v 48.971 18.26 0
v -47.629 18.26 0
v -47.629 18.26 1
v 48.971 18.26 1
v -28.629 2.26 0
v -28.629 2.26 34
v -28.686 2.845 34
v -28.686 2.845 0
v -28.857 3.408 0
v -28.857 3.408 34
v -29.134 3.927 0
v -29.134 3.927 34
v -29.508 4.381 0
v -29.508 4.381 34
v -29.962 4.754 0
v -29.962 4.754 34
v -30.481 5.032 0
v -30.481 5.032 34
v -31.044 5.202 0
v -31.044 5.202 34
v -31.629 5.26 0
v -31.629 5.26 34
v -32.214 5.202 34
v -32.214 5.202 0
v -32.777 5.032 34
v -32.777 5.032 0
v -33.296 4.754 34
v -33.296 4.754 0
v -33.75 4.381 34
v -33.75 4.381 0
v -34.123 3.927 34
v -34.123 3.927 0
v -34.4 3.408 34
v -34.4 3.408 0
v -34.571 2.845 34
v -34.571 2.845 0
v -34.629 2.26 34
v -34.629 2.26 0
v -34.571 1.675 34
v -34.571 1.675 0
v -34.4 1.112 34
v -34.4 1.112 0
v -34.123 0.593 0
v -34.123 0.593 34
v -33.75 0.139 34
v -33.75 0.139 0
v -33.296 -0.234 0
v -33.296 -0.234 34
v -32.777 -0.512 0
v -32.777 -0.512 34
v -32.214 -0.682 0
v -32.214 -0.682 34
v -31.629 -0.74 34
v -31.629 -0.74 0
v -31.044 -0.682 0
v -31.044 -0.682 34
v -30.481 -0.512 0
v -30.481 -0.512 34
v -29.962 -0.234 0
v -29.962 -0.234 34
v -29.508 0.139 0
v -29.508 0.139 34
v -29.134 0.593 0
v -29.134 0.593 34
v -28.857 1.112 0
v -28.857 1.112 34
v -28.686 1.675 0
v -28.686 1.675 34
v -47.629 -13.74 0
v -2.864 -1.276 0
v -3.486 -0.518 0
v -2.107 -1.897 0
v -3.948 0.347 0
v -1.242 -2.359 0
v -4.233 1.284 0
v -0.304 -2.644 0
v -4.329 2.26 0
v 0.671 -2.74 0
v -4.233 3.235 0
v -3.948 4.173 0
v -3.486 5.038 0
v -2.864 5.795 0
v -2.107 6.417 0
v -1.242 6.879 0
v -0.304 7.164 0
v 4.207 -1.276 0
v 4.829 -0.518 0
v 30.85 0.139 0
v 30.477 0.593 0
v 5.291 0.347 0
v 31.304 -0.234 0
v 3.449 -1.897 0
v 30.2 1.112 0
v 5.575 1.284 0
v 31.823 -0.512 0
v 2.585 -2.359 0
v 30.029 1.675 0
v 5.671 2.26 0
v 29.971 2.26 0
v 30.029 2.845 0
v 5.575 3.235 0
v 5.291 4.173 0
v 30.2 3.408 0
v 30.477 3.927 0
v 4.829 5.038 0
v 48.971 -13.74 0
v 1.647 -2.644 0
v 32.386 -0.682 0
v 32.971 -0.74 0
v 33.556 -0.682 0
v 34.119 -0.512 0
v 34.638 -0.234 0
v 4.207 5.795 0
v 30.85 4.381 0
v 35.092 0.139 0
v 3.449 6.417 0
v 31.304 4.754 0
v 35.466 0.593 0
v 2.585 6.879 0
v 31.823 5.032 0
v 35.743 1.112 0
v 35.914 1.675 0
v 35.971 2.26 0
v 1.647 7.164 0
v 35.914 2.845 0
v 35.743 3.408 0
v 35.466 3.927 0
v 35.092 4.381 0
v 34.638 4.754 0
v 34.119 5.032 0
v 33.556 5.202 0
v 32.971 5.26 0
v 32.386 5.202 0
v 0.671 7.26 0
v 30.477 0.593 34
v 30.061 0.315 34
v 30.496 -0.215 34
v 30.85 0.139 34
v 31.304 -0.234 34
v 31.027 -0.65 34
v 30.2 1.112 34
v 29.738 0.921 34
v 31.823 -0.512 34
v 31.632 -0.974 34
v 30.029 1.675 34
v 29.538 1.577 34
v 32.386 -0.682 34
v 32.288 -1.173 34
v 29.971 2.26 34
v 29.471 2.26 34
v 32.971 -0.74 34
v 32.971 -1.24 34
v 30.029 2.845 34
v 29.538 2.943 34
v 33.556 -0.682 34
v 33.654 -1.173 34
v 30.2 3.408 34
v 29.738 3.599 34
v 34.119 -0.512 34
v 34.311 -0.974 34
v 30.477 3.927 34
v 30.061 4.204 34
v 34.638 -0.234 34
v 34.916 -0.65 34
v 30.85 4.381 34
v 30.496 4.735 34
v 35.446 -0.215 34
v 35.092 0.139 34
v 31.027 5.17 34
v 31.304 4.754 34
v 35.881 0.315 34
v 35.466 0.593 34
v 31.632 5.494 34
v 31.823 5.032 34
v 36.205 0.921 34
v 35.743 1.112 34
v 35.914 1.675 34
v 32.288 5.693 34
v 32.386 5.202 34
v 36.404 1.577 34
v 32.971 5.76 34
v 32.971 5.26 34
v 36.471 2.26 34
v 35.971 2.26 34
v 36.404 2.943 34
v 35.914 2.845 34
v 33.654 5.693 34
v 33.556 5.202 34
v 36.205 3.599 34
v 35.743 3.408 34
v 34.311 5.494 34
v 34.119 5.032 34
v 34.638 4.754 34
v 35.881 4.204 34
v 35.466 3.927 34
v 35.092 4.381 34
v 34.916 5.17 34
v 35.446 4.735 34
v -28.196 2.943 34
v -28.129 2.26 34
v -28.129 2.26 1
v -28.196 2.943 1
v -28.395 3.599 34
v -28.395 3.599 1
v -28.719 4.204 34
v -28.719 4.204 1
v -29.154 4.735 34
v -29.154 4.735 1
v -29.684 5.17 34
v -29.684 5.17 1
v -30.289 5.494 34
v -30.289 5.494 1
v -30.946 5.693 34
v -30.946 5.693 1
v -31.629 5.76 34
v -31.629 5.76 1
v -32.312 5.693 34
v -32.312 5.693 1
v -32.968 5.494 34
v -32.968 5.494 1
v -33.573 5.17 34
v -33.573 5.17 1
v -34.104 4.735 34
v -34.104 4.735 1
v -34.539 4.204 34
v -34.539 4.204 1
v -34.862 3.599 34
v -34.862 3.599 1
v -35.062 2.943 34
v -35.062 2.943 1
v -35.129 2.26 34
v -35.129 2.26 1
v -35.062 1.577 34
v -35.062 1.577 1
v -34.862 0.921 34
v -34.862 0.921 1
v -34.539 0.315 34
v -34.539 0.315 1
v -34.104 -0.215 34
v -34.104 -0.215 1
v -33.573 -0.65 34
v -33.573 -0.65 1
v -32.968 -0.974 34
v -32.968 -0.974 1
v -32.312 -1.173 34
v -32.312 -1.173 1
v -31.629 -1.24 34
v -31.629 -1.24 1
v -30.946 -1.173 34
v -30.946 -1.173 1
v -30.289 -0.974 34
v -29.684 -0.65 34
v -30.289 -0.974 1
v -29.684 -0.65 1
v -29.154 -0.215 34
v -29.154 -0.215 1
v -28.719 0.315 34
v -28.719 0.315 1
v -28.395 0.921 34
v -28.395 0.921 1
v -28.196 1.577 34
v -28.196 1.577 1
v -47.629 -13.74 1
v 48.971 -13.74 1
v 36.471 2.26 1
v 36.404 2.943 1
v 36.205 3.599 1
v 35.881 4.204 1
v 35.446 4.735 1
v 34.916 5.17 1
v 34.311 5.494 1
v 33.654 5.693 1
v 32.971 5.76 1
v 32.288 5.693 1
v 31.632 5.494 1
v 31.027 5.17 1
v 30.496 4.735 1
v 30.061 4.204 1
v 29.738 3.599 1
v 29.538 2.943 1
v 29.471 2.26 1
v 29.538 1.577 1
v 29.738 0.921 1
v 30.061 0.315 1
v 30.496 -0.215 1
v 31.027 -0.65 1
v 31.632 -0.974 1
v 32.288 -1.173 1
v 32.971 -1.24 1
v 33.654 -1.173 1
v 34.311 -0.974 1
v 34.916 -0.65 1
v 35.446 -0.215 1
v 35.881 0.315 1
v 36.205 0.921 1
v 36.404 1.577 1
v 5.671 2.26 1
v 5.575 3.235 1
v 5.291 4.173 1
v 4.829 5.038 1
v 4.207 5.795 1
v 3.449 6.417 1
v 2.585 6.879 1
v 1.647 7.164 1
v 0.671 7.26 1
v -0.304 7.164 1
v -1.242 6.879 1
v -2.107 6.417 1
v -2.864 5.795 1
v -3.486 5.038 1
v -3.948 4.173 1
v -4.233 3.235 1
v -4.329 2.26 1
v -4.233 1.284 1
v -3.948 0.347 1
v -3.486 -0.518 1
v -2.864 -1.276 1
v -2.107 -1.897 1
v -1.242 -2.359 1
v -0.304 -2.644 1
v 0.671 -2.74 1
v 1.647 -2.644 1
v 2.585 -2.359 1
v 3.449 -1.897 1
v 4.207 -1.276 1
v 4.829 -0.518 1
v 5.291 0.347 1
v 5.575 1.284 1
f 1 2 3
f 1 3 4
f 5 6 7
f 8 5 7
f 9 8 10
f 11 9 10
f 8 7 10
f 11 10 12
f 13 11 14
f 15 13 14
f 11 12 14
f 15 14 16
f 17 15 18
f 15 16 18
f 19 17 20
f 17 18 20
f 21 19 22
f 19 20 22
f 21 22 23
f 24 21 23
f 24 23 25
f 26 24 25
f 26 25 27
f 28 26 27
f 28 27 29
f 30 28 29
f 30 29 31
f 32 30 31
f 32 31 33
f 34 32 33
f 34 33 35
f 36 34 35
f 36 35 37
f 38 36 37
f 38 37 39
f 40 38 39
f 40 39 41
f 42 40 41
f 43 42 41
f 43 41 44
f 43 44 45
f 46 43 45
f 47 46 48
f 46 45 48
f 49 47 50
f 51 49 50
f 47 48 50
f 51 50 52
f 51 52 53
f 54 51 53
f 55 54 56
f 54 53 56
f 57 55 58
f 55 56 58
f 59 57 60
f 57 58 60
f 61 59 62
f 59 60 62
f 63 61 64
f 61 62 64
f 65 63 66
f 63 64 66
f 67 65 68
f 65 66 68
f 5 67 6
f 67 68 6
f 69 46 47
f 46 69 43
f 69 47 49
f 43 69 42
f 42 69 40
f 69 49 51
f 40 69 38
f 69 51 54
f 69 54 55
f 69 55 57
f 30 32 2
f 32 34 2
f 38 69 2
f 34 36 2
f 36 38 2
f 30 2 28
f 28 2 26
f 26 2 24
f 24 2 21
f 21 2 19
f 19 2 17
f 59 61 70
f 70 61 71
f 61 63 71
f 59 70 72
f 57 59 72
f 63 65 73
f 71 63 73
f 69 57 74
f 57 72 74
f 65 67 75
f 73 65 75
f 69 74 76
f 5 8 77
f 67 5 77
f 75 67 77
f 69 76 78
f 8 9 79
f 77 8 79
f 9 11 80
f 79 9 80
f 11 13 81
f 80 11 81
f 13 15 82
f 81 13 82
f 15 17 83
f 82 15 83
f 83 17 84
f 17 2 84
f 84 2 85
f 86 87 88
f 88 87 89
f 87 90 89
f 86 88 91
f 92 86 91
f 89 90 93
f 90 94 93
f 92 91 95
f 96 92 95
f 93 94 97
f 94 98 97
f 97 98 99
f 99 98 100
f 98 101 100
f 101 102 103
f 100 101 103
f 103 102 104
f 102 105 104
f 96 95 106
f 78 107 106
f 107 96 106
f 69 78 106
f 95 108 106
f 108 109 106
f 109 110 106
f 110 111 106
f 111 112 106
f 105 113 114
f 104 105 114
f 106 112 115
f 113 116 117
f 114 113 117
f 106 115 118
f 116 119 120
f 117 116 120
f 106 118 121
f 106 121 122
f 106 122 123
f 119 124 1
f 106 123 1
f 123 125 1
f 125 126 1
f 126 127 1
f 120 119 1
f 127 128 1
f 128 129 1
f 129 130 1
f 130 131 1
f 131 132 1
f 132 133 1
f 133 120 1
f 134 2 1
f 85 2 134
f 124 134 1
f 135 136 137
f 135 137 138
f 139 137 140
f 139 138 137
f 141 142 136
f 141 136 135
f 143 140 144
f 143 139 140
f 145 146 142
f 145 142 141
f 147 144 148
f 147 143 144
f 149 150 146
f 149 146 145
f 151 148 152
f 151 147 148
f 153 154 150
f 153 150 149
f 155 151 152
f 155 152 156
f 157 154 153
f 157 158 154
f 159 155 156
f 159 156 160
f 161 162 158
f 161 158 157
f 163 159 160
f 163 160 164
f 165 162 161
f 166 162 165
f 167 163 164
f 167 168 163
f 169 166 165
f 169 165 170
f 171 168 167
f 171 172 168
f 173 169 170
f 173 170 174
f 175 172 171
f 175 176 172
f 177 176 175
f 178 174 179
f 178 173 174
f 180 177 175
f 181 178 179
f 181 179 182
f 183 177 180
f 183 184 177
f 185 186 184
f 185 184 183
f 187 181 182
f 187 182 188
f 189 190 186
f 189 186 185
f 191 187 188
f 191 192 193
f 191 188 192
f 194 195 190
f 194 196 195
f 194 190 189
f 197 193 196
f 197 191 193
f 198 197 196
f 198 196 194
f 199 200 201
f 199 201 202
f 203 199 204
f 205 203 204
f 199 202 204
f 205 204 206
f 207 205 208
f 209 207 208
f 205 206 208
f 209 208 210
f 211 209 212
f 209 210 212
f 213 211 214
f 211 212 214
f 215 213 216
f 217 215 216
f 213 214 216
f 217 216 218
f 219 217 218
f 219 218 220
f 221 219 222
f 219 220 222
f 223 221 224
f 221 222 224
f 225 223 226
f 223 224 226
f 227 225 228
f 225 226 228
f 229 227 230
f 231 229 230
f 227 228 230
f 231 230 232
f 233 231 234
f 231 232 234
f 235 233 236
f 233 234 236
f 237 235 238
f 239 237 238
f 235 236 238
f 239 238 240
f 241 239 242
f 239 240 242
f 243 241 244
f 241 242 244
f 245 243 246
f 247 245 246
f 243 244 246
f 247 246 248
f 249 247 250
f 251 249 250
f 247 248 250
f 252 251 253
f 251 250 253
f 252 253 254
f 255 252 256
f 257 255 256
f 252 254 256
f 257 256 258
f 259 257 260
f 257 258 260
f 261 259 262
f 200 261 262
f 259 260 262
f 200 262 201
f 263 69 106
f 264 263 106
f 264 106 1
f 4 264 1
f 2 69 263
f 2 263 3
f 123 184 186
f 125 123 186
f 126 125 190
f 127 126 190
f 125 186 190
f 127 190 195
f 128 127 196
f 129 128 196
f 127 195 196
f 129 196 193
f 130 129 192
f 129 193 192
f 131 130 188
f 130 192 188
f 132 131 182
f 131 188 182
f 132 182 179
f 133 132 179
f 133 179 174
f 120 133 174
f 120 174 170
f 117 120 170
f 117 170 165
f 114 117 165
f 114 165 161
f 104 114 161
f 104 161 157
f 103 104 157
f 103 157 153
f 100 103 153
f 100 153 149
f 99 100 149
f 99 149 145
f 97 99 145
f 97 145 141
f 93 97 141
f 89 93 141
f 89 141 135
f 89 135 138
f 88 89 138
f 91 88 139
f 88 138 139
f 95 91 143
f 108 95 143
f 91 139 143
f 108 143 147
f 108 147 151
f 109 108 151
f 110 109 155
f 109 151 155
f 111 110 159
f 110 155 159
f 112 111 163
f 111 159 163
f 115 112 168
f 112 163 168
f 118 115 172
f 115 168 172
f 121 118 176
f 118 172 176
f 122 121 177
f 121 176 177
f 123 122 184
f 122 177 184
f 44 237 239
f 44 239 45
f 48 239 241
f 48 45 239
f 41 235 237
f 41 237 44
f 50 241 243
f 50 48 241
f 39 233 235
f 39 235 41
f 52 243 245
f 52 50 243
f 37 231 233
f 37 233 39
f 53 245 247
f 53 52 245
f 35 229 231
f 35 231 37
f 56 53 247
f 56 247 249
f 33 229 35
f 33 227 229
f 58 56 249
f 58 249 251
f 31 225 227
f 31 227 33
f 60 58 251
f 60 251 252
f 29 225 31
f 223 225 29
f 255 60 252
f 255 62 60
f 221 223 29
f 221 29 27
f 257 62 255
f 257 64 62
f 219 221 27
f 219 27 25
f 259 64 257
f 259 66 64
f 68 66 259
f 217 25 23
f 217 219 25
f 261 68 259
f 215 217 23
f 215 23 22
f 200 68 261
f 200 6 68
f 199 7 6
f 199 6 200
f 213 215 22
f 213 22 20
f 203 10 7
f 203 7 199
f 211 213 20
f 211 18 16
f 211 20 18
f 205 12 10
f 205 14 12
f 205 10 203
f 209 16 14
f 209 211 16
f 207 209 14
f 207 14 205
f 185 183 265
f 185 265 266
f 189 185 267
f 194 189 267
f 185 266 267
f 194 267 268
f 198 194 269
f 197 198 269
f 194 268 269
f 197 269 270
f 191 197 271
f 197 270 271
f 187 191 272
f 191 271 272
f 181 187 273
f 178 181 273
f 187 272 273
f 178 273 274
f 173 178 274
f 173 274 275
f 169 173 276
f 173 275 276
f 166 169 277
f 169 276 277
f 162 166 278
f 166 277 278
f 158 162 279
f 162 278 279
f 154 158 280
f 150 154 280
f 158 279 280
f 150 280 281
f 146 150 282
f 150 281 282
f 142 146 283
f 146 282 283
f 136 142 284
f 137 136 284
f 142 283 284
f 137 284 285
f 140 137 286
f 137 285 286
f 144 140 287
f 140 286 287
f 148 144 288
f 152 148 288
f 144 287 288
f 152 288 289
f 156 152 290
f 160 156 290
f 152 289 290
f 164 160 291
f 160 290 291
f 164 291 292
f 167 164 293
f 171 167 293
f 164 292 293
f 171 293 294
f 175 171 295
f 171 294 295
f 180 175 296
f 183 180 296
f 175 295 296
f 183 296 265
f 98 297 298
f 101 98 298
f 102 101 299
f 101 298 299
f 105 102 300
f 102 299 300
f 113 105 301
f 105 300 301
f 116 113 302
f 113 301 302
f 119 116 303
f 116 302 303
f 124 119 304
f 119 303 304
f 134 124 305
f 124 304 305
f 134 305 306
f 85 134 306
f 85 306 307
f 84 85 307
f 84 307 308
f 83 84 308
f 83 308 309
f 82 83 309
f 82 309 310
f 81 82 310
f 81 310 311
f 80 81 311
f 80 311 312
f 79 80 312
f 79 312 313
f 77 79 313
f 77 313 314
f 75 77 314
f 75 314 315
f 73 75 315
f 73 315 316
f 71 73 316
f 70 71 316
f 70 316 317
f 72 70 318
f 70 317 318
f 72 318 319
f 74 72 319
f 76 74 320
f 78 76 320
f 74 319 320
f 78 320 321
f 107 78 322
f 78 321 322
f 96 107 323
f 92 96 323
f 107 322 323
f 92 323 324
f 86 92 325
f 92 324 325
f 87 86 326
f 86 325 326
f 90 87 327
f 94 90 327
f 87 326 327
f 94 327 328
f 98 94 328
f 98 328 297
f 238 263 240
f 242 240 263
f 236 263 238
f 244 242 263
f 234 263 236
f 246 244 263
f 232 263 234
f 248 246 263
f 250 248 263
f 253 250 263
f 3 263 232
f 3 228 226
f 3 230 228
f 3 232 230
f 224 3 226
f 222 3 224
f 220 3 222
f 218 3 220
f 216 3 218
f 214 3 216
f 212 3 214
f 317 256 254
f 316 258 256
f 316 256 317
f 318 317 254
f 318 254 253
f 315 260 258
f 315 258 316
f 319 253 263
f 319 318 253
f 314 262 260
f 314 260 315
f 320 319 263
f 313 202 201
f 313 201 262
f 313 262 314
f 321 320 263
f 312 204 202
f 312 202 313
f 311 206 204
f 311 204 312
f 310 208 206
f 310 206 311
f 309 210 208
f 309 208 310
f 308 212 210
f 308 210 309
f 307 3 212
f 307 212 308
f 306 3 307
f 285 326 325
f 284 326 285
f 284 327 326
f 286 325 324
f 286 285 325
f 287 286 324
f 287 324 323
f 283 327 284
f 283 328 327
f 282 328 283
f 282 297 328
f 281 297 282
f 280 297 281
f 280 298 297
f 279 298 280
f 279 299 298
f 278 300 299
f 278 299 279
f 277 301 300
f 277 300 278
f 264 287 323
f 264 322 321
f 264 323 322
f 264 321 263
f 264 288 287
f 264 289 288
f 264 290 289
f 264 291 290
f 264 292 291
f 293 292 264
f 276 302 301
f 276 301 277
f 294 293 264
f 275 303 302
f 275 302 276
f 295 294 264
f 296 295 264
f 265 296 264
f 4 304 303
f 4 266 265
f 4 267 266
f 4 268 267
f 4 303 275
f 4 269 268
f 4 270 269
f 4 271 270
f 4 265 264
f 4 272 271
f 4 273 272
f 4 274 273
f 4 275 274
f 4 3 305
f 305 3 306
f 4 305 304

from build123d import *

# Parameters (mm, degrees)
ESQUISSE1_W             = 96.6
ESQUISSE1_H             = 32
BOSS_EXTRU_1_DEPTH      = 1
ESQUISSE6_R             = 3.5
BOSS_EXTRU_2_DEPTH      = 33
ESQUISSE7_R             = 3
ESQUISSE7_R_2           = 5
ENL_V_MAT_EXTRU_1_DEPTH = 63.350617772


with BuildPart() as part:
    # Esquisse1 → Boss.-Extru.1 (new body)
    with BuildSketch(Plane.XY):
        with Locations((0.671156739, 2.259938231)):
            Rectangle(ESQUISSE1_W, ESQUISSE1_H)
    extrude(amount=BOSS_EXTRU_1_DEPTH)

    # Esquisse6 → Boss.-Extru.2 (add)
    with BuildSketch(Plane.XY.offset(1)):
        with Locations((-31.628843261, 2.259938231)):
            Circle(ESQUISSE6_R)
        with Locations((32.971156739, 2.259938231)):
            Circle(ESQUISSE6_R)
    extrude(amount=BOSS_EXTRU_2_DEPTH)

    # Esquisse7 → Enlèv. mat.-Extru.1 (cut, through all)
    with BuildSketch(Plane.XY.offset(34)):
        with Locations((-31.628843261, 2.259938231)):
            Circle(ESQUISSE7_R)
        with Locations((32.971156739, 2.259938231)):
            Circle(ESQUISSE7_R)
        with Locations((0.671156739, 2.259938231)):
            Circle(ESQUISSE7_R_2)
    extrude(amount=-ENL_V_MAT_EXTRU_1_DEPTH, mode=Mode.SUBTRACT)


solid = part.part
